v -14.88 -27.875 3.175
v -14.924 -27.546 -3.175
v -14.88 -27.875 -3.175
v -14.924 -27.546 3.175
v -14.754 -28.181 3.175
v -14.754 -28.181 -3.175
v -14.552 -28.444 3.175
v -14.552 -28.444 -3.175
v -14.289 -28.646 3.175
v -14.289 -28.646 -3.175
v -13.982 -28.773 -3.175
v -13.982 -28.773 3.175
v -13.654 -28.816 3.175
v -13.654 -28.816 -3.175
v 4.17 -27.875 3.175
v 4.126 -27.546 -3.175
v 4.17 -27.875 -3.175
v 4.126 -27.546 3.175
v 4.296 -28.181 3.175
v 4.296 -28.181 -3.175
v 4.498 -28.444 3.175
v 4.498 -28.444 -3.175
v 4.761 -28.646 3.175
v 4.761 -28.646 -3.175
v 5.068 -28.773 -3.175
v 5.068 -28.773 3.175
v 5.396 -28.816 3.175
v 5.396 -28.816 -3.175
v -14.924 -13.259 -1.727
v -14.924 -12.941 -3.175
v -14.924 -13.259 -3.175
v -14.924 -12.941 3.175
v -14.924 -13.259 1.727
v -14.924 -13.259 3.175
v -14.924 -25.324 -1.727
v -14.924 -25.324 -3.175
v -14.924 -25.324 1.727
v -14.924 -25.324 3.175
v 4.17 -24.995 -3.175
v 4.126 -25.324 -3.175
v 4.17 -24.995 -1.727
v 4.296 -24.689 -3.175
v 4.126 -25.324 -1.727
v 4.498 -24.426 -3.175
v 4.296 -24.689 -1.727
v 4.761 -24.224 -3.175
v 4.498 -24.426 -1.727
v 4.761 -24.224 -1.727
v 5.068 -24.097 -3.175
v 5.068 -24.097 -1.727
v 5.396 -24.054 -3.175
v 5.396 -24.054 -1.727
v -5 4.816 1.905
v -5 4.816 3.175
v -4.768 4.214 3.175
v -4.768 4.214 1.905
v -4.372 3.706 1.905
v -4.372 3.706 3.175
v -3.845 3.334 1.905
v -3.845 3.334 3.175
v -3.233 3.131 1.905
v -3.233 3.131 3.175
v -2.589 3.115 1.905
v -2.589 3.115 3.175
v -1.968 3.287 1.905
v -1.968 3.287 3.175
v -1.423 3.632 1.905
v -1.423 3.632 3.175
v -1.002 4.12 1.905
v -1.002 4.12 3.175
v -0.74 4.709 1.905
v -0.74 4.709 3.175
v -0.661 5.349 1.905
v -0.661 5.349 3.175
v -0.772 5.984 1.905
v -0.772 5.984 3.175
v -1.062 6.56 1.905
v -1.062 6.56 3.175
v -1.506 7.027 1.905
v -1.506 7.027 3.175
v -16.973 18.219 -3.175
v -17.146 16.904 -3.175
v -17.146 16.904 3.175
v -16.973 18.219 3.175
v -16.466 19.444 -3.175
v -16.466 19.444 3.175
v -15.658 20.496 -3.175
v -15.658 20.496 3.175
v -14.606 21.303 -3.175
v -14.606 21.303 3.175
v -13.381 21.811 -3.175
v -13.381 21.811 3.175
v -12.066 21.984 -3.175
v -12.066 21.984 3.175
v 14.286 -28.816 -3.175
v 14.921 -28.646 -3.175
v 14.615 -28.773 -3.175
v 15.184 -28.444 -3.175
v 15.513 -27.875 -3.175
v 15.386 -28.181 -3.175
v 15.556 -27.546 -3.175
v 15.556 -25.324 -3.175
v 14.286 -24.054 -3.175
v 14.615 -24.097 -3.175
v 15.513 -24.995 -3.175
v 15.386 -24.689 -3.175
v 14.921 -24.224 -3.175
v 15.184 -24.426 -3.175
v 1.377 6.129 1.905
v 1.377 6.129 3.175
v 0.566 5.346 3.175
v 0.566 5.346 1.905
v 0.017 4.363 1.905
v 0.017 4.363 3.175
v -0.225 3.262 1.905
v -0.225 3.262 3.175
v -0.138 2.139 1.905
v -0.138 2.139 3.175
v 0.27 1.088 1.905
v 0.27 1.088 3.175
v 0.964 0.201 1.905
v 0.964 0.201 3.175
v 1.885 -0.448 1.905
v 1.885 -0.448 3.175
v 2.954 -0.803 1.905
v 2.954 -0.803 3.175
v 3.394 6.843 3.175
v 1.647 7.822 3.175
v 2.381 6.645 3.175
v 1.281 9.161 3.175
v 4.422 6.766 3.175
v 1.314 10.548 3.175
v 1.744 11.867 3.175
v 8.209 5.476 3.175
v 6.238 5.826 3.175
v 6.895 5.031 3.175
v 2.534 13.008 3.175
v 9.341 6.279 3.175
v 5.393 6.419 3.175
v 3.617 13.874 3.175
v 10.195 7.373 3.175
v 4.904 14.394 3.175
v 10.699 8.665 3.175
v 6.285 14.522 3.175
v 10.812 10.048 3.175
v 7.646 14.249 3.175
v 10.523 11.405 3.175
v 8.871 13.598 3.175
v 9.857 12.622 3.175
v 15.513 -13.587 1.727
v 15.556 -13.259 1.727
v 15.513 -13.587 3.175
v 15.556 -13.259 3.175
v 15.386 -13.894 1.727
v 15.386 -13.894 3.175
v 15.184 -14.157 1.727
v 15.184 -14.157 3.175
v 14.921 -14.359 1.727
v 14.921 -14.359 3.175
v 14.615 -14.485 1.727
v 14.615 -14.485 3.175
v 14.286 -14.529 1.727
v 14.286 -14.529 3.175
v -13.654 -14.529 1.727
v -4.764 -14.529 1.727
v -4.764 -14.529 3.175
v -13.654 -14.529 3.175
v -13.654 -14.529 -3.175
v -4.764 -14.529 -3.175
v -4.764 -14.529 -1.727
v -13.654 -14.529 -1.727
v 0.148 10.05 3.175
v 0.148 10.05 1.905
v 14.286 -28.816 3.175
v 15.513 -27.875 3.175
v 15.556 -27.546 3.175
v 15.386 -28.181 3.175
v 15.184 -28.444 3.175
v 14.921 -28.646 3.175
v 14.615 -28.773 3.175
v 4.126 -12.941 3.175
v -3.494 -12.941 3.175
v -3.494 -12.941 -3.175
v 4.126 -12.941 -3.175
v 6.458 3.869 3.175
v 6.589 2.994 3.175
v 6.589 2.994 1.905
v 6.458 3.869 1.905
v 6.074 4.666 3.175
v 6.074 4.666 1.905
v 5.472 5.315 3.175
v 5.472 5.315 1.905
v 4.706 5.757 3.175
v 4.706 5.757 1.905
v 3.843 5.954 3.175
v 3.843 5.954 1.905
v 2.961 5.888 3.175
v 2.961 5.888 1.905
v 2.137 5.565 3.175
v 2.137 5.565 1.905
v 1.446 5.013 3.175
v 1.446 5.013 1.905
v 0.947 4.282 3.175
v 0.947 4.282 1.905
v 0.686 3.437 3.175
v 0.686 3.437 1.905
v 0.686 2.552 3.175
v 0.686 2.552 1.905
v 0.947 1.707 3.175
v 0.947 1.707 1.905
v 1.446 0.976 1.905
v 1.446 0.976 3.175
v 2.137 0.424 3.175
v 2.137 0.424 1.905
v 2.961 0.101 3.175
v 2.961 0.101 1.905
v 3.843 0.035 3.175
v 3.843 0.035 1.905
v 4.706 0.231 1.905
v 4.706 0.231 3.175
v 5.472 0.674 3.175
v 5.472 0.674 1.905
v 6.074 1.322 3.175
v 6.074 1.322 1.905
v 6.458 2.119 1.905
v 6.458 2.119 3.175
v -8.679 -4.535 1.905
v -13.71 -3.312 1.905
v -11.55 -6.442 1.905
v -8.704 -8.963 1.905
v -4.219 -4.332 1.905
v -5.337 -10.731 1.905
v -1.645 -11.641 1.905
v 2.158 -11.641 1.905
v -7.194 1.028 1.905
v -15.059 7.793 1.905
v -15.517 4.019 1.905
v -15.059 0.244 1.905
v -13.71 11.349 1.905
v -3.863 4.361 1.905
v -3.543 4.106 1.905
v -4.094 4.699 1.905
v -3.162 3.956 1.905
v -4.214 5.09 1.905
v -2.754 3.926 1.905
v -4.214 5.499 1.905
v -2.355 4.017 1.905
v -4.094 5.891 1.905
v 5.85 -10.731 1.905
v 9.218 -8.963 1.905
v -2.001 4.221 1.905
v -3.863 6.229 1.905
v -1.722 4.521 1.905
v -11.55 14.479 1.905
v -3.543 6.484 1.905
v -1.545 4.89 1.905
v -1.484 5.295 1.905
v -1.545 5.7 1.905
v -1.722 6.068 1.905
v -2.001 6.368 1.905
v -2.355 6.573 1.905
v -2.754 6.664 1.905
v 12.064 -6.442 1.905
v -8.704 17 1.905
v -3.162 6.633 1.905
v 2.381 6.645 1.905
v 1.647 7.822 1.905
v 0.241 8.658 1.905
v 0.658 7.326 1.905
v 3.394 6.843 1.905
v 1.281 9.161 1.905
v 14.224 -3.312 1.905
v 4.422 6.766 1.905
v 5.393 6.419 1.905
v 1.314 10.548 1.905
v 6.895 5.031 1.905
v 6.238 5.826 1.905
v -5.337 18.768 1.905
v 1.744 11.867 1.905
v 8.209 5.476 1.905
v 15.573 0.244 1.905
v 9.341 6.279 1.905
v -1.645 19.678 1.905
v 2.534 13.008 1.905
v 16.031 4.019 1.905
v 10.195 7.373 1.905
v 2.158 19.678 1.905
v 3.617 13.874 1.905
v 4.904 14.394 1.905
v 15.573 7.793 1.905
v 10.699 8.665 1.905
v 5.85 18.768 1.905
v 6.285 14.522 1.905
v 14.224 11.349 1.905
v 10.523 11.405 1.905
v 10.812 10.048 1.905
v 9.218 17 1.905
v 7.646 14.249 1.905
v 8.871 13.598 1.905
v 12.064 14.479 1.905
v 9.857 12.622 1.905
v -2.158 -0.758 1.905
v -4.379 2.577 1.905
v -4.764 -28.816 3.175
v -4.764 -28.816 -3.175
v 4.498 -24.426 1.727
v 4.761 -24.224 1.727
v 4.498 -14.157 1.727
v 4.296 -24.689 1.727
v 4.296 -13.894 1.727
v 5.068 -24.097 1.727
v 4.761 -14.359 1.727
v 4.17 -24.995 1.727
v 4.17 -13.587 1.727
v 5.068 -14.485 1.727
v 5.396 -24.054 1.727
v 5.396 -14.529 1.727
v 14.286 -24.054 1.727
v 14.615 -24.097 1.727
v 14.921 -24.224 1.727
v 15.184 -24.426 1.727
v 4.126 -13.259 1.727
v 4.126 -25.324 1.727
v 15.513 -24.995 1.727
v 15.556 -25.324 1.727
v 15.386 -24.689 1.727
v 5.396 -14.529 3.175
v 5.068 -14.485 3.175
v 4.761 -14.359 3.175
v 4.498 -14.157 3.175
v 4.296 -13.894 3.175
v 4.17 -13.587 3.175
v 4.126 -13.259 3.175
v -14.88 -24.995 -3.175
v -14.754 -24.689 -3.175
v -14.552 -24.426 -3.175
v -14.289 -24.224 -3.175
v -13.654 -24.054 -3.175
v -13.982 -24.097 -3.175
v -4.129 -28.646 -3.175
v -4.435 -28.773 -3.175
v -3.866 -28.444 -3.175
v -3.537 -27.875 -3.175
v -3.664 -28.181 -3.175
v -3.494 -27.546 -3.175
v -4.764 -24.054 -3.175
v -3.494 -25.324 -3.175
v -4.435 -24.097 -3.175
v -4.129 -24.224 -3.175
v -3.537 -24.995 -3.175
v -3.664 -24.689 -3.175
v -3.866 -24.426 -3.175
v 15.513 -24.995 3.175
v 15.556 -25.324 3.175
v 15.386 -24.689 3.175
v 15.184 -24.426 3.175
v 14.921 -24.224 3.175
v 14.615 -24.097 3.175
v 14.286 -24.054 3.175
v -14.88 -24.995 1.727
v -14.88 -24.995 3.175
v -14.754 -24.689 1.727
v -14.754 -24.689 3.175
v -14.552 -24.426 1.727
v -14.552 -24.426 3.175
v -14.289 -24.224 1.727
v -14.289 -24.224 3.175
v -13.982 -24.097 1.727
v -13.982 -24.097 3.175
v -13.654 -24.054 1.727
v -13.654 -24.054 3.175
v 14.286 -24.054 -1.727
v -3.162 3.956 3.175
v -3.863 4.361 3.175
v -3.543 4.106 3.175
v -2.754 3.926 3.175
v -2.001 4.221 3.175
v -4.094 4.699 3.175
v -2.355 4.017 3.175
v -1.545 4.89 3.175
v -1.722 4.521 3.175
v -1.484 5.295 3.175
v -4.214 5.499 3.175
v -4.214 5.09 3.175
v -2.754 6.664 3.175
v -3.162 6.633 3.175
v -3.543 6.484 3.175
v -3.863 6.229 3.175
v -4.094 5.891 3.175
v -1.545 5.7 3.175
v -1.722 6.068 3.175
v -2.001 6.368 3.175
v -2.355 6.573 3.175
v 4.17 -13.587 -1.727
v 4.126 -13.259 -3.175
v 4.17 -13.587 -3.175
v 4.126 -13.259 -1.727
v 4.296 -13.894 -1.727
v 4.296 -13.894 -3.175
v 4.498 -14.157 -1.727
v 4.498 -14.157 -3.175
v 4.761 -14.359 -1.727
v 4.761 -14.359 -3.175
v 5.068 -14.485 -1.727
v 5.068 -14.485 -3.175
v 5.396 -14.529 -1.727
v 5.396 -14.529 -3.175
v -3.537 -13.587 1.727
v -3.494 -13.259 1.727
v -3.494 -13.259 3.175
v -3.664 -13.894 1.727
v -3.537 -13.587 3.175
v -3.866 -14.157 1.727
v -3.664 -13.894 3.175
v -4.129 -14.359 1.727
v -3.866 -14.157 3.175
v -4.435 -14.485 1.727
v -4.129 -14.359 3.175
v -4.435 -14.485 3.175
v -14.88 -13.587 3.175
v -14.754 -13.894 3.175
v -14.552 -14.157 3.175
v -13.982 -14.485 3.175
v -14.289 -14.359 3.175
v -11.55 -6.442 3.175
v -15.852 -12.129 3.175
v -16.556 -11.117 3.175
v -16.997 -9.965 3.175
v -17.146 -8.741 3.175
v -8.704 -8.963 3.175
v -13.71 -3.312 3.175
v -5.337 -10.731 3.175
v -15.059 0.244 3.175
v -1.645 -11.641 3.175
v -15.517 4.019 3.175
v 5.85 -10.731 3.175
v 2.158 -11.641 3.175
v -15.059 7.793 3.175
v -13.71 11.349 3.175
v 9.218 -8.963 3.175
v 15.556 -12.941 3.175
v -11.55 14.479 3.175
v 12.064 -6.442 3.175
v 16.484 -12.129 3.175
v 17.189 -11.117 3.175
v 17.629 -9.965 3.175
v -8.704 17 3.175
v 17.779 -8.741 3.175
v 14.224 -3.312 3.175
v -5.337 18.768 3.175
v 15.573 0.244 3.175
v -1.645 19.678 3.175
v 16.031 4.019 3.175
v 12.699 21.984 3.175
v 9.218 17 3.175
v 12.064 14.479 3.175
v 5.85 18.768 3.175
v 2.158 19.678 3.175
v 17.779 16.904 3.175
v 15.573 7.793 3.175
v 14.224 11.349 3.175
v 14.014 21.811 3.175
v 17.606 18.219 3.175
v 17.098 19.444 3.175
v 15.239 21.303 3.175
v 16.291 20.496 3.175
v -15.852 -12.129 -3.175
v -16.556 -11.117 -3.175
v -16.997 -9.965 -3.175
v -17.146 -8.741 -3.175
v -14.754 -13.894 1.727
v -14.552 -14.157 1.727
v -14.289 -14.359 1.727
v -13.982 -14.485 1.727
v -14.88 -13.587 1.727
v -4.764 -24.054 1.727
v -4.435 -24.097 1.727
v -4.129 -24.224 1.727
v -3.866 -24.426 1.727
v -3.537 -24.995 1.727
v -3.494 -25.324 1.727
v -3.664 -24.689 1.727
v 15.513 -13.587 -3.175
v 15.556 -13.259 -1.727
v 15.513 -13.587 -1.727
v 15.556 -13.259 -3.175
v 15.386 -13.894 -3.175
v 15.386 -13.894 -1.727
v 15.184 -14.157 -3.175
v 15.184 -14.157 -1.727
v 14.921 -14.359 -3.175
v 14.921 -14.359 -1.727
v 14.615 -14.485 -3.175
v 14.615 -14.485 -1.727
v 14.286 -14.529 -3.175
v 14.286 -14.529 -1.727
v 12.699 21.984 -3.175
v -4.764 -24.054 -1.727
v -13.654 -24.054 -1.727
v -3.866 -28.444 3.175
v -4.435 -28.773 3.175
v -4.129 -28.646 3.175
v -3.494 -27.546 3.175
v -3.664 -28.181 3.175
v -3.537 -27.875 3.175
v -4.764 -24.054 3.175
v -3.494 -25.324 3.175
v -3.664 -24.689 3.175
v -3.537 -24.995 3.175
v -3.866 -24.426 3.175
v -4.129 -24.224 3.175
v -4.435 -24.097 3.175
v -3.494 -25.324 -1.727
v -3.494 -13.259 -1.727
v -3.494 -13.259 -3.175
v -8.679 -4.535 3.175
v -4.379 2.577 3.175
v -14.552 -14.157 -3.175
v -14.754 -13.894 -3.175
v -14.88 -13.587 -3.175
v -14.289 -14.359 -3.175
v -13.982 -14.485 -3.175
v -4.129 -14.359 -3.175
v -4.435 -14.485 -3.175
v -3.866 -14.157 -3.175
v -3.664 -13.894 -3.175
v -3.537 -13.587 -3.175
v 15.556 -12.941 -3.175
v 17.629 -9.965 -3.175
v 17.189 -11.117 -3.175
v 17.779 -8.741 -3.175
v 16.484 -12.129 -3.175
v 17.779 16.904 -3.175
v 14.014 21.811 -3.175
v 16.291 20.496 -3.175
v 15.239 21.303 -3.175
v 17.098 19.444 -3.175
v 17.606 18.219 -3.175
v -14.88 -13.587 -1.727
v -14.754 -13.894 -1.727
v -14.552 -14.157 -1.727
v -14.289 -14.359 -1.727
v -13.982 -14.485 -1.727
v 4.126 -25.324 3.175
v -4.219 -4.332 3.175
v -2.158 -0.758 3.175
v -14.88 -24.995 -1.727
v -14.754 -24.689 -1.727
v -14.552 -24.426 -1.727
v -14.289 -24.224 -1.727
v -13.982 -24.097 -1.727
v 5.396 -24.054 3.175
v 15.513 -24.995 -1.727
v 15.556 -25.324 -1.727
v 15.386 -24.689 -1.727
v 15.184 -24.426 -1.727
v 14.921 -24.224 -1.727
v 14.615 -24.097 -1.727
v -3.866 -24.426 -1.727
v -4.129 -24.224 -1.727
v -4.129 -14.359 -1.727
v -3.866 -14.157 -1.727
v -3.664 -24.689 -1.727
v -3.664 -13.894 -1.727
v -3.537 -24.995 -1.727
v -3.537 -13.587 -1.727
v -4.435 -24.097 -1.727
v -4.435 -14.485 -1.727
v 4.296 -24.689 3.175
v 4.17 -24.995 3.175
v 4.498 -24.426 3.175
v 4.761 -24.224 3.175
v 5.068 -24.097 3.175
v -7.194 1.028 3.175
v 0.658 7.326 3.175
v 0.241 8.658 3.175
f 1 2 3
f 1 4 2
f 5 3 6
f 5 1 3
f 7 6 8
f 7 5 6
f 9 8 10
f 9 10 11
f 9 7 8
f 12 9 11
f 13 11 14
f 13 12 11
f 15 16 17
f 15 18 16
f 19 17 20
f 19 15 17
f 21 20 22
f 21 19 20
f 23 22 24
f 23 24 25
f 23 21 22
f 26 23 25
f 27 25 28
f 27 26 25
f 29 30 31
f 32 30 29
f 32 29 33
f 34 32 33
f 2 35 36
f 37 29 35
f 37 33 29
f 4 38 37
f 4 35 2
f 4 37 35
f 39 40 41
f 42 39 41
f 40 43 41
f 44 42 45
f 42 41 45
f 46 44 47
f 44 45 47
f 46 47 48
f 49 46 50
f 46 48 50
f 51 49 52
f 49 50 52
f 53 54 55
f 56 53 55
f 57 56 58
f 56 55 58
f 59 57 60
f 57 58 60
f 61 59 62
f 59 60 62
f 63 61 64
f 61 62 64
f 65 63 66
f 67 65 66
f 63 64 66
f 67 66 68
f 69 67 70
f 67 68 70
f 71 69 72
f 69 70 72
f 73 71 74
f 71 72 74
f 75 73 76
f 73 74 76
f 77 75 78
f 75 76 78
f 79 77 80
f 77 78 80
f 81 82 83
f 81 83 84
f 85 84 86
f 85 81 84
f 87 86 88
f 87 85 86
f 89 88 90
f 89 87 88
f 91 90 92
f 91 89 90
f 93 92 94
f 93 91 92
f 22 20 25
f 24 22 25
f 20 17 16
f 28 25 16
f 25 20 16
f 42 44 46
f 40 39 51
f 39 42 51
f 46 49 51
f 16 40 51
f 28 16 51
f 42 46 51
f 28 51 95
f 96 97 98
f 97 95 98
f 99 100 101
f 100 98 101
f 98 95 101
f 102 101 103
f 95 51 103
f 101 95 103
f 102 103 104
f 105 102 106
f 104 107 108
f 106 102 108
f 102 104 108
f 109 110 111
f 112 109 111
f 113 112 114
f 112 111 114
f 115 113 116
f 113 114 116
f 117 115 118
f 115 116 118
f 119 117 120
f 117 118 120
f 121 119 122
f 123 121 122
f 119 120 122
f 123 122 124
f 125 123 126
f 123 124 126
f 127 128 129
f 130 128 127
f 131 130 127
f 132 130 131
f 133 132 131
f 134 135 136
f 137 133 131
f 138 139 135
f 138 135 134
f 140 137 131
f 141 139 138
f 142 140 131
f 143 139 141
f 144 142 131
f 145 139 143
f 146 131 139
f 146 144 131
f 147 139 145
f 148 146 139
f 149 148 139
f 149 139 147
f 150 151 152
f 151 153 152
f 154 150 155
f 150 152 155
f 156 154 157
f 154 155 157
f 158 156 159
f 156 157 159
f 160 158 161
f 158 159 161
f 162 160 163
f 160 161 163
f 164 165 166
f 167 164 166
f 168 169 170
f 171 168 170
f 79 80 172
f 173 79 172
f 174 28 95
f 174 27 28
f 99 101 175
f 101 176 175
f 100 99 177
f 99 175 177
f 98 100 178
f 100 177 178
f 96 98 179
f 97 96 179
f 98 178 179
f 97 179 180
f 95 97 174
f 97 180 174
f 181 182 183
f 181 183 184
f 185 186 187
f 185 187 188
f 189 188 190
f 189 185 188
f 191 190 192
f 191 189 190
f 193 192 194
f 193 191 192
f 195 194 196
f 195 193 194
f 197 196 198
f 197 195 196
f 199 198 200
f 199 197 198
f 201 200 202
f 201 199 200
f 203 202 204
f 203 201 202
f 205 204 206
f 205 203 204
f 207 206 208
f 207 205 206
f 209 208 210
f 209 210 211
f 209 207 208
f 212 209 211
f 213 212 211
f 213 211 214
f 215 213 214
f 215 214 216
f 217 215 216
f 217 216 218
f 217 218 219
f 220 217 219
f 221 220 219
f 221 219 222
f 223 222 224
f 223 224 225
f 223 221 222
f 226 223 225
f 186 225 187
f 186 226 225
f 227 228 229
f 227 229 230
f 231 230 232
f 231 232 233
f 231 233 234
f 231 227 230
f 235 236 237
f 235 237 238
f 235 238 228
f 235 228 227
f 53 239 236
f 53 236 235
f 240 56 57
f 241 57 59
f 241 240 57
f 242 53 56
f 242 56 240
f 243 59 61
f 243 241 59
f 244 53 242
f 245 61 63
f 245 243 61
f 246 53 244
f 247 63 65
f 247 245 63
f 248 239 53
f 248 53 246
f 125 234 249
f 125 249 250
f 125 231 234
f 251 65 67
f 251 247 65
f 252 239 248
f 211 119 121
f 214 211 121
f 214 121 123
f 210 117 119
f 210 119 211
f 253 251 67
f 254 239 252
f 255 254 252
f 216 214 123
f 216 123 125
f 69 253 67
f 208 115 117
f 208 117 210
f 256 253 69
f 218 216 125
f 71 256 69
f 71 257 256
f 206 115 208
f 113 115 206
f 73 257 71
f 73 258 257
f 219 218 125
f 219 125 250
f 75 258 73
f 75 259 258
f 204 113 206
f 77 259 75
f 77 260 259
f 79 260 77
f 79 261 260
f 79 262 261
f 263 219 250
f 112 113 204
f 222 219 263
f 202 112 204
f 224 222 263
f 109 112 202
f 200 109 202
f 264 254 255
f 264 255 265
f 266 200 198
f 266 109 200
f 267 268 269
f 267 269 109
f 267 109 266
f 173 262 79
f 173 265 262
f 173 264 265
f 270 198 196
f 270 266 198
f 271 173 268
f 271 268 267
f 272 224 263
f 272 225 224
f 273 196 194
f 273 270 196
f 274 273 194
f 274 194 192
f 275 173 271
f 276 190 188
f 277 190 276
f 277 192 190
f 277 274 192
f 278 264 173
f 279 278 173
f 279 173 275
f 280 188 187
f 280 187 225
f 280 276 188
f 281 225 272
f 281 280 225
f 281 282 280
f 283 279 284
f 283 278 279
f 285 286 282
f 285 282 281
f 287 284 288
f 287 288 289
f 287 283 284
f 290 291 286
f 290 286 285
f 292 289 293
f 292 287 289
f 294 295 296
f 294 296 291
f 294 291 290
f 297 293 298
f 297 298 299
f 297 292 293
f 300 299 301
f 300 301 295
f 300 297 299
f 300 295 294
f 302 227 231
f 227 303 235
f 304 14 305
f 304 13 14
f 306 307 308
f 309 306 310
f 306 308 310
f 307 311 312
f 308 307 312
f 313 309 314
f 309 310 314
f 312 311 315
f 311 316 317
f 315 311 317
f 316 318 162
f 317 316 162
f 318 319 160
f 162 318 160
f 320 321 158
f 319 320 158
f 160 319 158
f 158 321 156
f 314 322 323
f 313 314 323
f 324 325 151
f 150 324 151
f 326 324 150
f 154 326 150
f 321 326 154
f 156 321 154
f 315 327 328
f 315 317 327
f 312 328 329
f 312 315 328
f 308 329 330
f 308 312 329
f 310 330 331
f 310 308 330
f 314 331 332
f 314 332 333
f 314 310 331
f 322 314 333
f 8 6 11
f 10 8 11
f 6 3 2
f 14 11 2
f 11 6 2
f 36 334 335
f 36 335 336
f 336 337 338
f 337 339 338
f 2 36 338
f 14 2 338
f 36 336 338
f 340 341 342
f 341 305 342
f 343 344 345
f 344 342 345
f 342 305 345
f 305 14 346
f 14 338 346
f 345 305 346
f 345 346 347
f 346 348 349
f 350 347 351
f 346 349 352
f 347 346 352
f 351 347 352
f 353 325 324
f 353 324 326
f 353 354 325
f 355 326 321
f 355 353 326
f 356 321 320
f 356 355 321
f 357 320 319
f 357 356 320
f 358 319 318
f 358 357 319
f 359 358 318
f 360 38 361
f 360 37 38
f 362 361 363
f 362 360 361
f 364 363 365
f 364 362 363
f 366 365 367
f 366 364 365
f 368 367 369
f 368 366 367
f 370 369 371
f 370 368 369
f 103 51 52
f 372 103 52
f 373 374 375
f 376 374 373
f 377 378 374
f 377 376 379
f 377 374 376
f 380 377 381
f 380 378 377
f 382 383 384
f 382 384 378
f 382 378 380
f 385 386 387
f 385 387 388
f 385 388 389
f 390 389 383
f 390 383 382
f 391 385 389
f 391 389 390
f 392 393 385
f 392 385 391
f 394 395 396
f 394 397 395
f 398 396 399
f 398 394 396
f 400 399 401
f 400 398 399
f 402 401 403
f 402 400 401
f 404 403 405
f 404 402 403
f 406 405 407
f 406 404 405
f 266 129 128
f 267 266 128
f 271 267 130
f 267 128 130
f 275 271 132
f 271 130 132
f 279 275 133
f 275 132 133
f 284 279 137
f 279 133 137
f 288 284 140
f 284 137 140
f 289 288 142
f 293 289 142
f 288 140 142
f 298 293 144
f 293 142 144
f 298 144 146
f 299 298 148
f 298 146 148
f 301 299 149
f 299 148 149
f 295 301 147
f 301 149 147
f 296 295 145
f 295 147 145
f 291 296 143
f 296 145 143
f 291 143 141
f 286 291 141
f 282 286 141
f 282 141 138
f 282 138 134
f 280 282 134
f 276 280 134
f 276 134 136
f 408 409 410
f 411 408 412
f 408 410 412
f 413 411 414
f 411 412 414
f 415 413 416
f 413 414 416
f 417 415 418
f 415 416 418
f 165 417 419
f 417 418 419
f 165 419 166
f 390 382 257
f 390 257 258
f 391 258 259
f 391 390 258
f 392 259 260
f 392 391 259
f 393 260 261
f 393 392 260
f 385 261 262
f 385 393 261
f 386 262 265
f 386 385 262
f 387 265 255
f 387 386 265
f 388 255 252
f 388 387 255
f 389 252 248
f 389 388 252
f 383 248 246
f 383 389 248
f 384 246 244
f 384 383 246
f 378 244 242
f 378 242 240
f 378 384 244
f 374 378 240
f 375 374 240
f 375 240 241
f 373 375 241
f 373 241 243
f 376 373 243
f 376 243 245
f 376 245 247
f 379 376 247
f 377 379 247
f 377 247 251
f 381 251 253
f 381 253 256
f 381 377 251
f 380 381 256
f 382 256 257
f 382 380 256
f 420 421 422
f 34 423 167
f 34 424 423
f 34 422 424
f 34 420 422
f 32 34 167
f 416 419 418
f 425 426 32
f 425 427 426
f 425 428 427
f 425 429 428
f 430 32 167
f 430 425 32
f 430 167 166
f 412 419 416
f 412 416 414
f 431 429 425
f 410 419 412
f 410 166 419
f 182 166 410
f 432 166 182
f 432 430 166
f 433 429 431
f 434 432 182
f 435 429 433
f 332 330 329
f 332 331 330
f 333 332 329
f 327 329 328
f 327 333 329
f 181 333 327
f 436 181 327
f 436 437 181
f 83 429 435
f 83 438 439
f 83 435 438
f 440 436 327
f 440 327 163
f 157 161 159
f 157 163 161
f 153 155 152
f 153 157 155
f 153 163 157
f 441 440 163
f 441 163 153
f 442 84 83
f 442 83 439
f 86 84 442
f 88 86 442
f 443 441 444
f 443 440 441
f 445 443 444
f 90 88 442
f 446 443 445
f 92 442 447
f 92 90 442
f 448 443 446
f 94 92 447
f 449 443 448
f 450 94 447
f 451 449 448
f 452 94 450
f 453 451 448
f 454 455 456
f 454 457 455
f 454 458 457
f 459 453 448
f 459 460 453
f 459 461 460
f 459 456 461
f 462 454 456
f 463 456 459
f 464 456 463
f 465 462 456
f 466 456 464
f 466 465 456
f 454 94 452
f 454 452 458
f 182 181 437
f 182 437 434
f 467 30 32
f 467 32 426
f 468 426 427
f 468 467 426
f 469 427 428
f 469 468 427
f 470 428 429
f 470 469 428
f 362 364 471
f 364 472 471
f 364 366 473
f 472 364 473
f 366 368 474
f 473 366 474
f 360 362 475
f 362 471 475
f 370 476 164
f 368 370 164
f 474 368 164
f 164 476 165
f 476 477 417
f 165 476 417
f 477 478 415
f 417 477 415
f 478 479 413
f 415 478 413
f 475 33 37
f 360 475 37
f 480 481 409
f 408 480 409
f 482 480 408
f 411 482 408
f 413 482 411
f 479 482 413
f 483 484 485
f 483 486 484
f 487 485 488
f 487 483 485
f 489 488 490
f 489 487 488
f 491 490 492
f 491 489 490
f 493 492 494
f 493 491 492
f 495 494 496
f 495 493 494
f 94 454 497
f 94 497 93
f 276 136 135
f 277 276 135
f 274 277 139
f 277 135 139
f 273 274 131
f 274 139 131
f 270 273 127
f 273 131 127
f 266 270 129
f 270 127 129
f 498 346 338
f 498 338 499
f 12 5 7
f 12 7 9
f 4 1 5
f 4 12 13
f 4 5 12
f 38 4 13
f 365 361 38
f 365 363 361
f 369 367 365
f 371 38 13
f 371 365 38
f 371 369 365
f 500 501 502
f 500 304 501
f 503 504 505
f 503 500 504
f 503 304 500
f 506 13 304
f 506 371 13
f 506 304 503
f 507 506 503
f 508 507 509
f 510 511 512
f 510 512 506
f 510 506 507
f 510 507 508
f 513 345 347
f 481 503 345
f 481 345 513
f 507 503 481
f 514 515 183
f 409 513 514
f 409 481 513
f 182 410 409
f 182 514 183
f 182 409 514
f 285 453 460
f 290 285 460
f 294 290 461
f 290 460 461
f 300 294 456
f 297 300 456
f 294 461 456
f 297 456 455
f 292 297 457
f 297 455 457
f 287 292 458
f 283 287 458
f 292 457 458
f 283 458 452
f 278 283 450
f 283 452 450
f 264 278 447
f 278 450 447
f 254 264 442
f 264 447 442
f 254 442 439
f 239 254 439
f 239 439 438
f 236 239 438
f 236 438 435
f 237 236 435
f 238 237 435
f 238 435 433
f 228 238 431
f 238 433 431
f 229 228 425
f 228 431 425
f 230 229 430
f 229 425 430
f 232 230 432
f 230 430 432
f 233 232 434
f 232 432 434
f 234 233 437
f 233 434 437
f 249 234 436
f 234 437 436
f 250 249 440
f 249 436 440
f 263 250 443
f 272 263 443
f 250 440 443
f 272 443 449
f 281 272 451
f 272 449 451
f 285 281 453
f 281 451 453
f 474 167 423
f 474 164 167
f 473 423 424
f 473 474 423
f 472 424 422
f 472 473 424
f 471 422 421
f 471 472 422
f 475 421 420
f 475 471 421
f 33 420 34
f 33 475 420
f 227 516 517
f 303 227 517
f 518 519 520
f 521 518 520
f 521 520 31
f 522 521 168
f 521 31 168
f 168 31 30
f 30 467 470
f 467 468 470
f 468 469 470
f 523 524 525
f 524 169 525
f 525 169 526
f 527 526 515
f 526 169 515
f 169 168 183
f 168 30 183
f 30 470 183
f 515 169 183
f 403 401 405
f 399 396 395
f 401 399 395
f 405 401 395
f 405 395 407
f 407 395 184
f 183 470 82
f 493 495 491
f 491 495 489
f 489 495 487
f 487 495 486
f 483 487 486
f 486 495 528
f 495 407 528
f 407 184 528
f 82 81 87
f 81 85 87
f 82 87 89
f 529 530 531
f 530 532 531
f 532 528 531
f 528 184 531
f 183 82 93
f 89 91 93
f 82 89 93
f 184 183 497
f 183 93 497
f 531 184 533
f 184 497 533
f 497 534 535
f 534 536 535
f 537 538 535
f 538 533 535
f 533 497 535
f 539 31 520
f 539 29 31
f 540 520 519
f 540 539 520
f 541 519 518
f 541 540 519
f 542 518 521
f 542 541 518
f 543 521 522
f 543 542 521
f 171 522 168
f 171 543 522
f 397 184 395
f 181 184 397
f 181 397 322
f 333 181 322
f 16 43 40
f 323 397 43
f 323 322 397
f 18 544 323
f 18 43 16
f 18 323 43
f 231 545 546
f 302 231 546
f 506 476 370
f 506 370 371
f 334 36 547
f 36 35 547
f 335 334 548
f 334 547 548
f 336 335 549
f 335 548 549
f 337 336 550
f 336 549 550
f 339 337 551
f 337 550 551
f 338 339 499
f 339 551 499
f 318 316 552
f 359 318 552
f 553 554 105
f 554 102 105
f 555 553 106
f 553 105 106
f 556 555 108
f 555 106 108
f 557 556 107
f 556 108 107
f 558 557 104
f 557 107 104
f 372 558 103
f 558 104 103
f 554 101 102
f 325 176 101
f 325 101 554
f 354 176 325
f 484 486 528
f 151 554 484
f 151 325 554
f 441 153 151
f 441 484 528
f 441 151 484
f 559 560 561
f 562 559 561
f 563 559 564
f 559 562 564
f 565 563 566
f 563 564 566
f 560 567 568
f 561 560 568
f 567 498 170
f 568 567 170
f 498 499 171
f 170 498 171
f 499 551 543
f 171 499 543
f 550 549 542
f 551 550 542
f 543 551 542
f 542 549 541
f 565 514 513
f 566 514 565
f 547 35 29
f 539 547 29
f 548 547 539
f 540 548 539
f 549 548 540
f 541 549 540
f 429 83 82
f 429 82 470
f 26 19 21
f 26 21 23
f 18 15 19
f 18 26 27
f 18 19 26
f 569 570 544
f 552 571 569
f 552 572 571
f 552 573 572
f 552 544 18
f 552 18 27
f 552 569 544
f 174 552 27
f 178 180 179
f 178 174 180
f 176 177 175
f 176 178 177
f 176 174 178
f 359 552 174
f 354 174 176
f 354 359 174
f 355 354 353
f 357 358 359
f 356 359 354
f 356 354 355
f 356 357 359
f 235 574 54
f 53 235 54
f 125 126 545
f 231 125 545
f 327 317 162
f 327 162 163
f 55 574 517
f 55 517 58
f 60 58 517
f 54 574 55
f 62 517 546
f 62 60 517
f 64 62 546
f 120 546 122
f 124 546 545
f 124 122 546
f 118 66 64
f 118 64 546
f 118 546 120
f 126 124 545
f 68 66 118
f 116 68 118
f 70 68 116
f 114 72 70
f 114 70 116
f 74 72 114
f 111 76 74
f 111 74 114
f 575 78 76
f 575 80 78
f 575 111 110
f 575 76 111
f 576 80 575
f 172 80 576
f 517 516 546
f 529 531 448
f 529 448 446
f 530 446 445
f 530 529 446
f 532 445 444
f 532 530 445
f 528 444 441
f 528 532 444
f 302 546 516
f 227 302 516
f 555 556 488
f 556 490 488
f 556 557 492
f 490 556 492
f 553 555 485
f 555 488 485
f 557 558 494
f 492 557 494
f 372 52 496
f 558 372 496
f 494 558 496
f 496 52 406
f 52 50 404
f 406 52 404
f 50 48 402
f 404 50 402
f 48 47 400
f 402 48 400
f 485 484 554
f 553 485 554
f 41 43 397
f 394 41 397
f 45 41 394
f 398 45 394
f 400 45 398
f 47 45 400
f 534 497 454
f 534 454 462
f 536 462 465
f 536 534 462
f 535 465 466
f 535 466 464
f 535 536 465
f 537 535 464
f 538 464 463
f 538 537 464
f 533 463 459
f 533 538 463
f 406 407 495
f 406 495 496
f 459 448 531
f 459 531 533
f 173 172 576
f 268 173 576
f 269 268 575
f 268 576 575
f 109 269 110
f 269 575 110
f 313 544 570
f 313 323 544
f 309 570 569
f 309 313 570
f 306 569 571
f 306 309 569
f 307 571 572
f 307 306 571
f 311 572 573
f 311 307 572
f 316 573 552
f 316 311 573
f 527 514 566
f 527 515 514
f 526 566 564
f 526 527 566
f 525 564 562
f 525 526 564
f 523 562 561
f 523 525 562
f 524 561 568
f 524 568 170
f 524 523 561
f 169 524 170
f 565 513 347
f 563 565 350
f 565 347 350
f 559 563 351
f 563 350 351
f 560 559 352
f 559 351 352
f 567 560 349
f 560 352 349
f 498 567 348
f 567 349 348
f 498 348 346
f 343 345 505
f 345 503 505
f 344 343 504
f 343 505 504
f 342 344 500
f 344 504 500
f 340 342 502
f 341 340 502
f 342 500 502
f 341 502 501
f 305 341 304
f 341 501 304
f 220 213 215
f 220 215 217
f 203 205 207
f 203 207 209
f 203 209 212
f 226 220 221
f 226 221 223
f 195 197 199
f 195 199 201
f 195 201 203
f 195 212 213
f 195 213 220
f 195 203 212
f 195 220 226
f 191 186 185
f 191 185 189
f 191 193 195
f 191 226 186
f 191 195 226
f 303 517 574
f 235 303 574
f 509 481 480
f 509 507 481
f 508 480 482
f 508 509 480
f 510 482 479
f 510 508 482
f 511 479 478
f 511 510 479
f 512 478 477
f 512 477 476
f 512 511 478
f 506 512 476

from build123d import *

# Parameters (mm, degrees)
F1_DEPTH    = 3.175
F2_W        = 9.525
F2_H        = 1.4478
F3_DEPTH    = 25.4
F4_R        = 15.7740752149
F4_R_2      = 2.9681243023
F4_R_3      = 1.3729847112
F5_DEPTH    = 1.27
F6_T1_DEPTH = 31.75
F6_T3_DEPTH = 27.3506510316
F7_R        = 1.27


# Not quite as in the source:
# - a fillet or chamfer that OpenCascade refuses, or shapes differently, is made with other operations: its cross-section is extruded or revolved along the edge and cut away or added


with BuildPart() as f1:
    # F0 (on Top) → F1 (new body, symmetric)
    with BuildSketch(Plane.XY):
        Polygon((17.7787664203, 21.9838270611), (-17.1462335797, 21.9838270611), (-17.1462335797, -12.9411729389), (-14.9237335797, -12.9411729389), (-14.9237335797, -28.8161729389), (-3.4937335797, -28.8161729389), (-3.4937335797, -12.9411729389), (4.1262664203, -12.9411729389), (4.1262664203, -28.8161729389), (15.5562664203, -28.8161729389), (15.5562664203, -12.9411729389), (17.7787664203, -12.9411729389), align=None)
    extrude(amount=F1_DEPTH, both=True)

    # F2 (on Right) → F3 (cut, symmetric)
    with BuildSketch(Plane.YZ):
        with Locations((-19.2911729389, -2.4511)):
            Rectangle(F2_W, F2_H)
        with Locations((-19.2911729389, 2.4511)):
            Rectangle(F2_W, F2_H)
    extrude(amount=F3_DEPTH, both=True, mode=Mode.SUBTRACT)

    # F4 (on face) → F5 (cut)
    with BuildSketch(Plane.XY.offset(3.175)):
        with Locations((0.2568493655, 4.0185162798)):
            Circle(F4_R)
        with BuildLine():
            Line((-1.5064536128, 7.0266816765), (0.1482767001, 10.0501550651))
            ThreePointArc((0.1482767001, 10.0501550651), (0.4096706183, 7.9792062399), (1.3765677405, 6.1292695458))
            ThreePointArc((1.3765677405, 6.1292695458), (-0.1382695754, 2.1387635418), (2.9542085605, -0.8032509449))
            Line((2.9542085605, -0.8032509449), (-4.2190060268, -4.3320505521))
            Line((-4.2190060268, -4.3320505521), (-2.1576185001, -0.7580867248))
            Line((-2.1576185001, -0.7580867248), (-8.6794582017, -4.5345938661))
            Line((-8.6794582017, -4.5345938661), (-4.3788731984, 2.5767316464))
            Line((-4.3788731984, 2.5767316464), (-7.1943101482, 1.0284683409))
            Line((-7.1943101482, 1.0284683409), (-4.9999261676, 4.815935468))
            ThreePointArc((-4.9999261676, 4.815935468), (-1.6824509255, 3.4391903431), (-1.5064536128, 7.0266816765))
        make_face(mode=Mode.SUBTRACT)
        with Locations((3.6213599069, 2.9943462909)):
            Circle(F4_R_2, mode=Mode.SUBTRACT)
        with Locations((-2.8567614499, 5.2948631346)):
            Circle(F4_R_3, mode=Mode.SUBTRACT)
        with BuildLine():
            ThreePointArc((2.3814487819, 6.6452990552), (7.6456545146, 14.2492672348), (6.8950720548, 5.0314139032))
            ThreePointArc((6.8950720548, 5.0314139032), (4.9195289911, 6.6249926126), (2.3814487819, 6.6452990552))
        make_face(mode=Mode.SUBTRACT)
    extrude(amount=-F5_DEPTH, mode=Mode.SUBTRACT)

    # F6: fillet of radius 5.08 on 4 edges, made by hand

    # F6_s2 → F6_t1 (cut)
    with BuildSketch(Plane.XY.offset(-15.875)):
        with BuildLine():
            ThreePointArc((12.6987664203, 21.9838270611), (16.2908688687, 20.4959295096), (17.7787664203, 16.9038270611))
            Line((17.7787664203, 16.9038270611), (17.7787664203, 21.9838270611))
            Line((17.7787664203, 21.9838270611), (12.6987664203, 21.9838270611))
        make_face()
        with BuildLine():
            ThreePointArc((-17.1462335797, 16.9038270611), (-15.6583360282, 20.4959295096), (-12.0662335797, 21.9838270611))
            Line((-12.0662335797, 21.9838270611), (-17.1462335797, 21.9838270611))
            Line((-17.1462335797, 21.9838270611), (-17.1462335797, 16.9038270611))
        make_face()
    extrude(amount=F6_T1_DEPTH, mode=Mode.SUBTRACT)

    # F6_s4 → F6_t3 (cut)
    with BuildSketch(Plane.XY.offset(-13.6753255158)):
        with BuildLine():
            ThreePointArc((-14.9237335797, -12.9411729388), (-16.5563616403, -11.1169951731), (-17.1462335797, -8.7410427325))
            Line((-17.1462335797, -8.7410427325), (-17.1462335797, -12.9411729389))
            Line((-17.1462335797, -12.9411729389), (-14.9237335797, -12.9411729388))
        make_face()
        with BuildLine():
            ThreePointArc((17.7787664203, -8.7410427325), (17.1888944808, -11.1169951731), (15.5562664203, -12.9411729388))
            Line((15.5562664203, -12.9411729388), (17.7787664203, -12.9411729389))
            Line((17.7787664203, -12.9411729389), (17.7787664203, -8.7410427325))
        make_face()
    extrude(amount=F6_T3_DEPTH, mode=Mode.SUBTRACT)

    # F7
    f7_edges = [f1.edges().sort_by_distance(p)[0] for p in [
        (-14.923734, -14.528673, 2.4511),
        (-3.493734, -14.528673, 2.4511),
        (15.556266, -14.528673, 2.4511),
        (4.126266, -14.528673, 2.4511),
        (15.556266, -14.528673, -2.4511),
        (4.126266, -14.528673, -2.4511),
        (-14.923734, -14.528673, -2.4511),
        (-3.493734, -14.528673, -2.4511),
        (-3.493734, -24.053673, -2.4511),
        (-3.493734, -24.053673, 2.4511),
        (15.556266, -24.053673, -2.4511),
        (15.556266, -24.053673, 2.4511),
        (15.556266, -28.816173, 0),
        (4.126266, -28.816173, 0),
        (-3.493734, -28.816173, 0),
        (-14.923734, -28.816173, 0),
        (-14.923734, -24.053673, 2.4511),
        (-14.923734, -24.053673, -2.4511),
        (4.126266, -24.053673, 2.4511),
        (4.126266, -24.053673, -2.4511),
    ]]
    fillet(f7_edges, radius=F7_R)


solid = f1.part
